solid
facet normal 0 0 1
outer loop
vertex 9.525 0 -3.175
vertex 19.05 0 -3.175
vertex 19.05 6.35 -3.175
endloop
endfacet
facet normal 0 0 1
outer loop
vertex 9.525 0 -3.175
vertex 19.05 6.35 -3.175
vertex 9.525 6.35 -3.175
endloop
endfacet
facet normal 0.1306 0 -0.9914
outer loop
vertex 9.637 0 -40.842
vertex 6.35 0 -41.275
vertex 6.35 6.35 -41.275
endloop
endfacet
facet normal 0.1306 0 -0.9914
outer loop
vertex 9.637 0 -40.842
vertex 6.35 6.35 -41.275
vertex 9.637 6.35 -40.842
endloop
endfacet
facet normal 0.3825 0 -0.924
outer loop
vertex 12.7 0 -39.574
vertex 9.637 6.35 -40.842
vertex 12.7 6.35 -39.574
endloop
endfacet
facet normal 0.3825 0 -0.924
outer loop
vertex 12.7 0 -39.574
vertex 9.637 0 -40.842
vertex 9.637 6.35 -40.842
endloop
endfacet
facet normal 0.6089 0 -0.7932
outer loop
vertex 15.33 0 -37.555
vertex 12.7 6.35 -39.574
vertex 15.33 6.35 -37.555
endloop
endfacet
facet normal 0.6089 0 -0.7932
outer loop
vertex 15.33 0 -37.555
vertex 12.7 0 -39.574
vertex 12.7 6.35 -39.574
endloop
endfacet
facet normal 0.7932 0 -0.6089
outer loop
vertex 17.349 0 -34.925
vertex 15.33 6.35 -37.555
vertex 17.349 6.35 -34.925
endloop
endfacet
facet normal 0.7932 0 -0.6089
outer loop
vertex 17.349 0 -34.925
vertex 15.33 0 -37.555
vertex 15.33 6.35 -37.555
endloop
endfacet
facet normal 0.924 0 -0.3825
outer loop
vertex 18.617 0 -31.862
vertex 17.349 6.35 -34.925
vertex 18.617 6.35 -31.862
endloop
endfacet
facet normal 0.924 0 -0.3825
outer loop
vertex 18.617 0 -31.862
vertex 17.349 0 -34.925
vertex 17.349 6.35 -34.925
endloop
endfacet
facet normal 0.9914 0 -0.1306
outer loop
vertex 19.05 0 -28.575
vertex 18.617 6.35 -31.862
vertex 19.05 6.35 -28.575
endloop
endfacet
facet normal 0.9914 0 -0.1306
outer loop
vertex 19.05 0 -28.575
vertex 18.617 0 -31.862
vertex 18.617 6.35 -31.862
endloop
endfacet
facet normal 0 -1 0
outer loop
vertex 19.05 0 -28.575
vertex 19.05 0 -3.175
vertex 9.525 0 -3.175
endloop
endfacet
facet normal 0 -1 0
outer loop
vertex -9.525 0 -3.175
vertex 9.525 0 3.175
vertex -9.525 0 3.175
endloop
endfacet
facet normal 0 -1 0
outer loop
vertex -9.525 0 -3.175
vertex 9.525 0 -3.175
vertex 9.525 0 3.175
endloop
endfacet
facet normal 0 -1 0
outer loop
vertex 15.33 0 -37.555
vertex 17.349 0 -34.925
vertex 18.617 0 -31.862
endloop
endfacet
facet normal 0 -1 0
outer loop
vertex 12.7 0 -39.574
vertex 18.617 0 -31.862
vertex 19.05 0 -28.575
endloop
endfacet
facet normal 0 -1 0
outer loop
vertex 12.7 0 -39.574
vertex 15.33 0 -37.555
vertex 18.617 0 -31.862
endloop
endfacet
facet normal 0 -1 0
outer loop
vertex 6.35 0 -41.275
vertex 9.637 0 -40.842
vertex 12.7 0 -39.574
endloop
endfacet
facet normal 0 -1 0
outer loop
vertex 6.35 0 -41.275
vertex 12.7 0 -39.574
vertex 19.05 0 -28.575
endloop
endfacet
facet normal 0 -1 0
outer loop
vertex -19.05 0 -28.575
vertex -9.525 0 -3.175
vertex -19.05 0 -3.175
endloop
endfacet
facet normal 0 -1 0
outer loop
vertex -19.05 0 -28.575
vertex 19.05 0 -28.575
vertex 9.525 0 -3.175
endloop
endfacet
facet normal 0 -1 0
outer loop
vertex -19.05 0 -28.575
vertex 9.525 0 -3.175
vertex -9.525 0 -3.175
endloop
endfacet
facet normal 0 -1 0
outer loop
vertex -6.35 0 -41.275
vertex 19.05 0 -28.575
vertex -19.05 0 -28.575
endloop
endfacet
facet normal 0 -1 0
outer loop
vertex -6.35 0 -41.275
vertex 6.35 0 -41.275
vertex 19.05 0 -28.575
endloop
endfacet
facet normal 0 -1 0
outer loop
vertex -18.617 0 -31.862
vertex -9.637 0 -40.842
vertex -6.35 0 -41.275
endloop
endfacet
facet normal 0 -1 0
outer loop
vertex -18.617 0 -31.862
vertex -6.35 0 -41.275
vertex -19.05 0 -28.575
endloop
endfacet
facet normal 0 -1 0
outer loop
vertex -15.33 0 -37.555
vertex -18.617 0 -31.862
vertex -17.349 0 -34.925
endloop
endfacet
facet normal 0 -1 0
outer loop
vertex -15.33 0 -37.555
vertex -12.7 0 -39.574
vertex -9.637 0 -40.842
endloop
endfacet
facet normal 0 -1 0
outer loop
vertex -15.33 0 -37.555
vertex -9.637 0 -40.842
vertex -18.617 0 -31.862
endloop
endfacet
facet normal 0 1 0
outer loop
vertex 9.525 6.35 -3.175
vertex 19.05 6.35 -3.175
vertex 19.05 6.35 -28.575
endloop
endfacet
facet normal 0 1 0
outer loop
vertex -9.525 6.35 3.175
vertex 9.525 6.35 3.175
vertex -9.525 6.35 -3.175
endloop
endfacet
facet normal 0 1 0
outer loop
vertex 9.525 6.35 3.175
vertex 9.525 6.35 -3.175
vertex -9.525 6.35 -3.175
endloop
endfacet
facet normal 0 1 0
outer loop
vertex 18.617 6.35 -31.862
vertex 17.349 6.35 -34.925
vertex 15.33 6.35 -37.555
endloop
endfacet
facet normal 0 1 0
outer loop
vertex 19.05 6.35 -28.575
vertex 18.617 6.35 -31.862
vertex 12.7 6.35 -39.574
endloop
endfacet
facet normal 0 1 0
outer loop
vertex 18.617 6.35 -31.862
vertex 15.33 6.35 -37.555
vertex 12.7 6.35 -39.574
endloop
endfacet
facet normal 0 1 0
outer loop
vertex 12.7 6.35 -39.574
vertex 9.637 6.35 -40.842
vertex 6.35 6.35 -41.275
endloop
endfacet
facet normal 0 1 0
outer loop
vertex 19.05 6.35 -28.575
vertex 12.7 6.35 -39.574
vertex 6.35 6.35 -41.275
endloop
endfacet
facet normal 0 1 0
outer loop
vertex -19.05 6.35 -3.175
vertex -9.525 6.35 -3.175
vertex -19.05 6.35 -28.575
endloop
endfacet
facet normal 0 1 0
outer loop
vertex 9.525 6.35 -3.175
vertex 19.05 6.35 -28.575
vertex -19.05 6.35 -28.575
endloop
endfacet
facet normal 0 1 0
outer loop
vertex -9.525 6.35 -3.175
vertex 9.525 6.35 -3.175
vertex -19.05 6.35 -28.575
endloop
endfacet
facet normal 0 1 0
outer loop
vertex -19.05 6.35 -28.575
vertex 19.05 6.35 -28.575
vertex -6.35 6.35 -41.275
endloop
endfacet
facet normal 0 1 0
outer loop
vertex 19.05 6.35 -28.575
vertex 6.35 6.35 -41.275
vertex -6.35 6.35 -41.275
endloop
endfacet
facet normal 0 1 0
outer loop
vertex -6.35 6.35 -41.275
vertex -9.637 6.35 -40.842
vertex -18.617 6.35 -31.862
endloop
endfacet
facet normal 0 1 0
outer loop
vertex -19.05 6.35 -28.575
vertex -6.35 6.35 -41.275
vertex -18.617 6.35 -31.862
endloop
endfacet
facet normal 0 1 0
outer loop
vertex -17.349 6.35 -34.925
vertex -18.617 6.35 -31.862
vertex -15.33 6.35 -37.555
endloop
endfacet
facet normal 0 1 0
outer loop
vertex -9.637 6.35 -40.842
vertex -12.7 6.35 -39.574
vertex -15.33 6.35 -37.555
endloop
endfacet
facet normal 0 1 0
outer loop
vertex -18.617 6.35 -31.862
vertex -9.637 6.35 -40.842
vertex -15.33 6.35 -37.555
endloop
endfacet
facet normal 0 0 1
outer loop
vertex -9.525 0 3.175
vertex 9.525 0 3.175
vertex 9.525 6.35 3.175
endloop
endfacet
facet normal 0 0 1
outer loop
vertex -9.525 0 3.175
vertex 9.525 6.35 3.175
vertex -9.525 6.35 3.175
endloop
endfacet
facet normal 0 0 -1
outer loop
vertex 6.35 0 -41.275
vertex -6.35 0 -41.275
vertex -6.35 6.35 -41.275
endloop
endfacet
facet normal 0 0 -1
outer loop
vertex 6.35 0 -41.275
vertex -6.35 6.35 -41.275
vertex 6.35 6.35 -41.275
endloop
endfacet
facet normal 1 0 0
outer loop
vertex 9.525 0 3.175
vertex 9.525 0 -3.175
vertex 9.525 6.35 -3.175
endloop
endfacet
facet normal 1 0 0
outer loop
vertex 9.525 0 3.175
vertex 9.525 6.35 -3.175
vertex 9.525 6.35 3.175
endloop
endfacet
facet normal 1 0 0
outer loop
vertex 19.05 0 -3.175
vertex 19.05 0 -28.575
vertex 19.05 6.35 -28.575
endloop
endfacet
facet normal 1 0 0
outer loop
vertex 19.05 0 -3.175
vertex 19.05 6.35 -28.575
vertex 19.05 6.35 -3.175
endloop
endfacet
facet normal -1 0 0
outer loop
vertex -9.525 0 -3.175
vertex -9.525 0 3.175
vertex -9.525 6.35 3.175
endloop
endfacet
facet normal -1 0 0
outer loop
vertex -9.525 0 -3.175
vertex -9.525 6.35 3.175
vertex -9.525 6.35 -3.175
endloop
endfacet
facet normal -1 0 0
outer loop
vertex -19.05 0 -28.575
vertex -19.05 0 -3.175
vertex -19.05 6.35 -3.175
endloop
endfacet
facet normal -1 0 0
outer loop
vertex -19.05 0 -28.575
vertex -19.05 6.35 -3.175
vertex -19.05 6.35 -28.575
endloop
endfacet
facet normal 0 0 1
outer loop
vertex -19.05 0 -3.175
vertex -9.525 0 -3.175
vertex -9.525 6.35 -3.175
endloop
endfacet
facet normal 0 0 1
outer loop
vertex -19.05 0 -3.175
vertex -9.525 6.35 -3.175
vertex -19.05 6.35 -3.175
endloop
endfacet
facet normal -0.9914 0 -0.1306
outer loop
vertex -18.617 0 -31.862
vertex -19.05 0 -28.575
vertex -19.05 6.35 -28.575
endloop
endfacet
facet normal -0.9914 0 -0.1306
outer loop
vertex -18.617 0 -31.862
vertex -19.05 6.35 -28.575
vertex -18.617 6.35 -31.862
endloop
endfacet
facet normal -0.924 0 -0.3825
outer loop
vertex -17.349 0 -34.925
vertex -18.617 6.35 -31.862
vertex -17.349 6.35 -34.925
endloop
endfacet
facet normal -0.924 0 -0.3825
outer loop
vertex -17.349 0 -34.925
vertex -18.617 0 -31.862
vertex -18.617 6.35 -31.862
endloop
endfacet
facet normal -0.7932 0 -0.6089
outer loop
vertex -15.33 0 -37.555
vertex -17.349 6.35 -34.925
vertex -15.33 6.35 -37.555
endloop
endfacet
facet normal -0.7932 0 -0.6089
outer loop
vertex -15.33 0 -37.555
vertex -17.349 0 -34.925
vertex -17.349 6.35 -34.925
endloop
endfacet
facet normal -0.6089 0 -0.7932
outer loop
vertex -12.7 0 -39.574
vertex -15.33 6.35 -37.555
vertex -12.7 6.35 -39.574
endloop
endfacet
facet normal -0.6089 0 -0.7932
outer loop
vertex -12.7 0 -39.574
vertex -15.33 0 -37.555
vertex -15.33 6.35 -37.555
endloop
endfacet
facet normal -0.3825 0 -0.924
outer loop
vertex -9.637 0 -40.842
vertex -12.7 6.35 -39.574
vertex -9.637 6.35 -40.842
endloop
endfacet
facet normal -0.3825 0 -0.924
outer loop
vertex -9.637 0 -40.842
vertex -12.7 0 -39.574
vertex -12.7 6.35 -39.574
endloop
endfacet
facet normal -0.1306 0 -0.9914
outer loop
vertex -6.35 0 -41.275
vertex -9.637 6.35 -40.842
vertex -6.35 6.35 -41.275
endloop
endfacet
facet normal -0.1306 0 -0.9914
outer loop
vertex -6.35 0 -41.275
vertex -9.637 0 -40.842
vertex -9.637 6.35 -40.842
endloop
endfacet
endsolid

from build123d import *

# Parameters (mm, degrees)
BOSS_EXTRUDE1_DEPTH = 6.35


with BuildPart() as part:
    # Sketch1 → Boss-Extrude1 (new body)
    with BuildSketch(Plane(origin=(0, 0, 0), x_dir=(1, 0, 0), z_dir=(0, 1, 0))):
        with BuildLine():
            Line((9.525, -3.175), (-9.525, -3.175))
            Line((-9.525, -3.175), (-9.525, 3.175))
            Line((-9.525, 3.175), (-19.05, 3.175))
            Line((-19.05, 3.175), (-19.05, 28.575))
            ThreePointArc((-19.05, 28.575), (-15.330256121, 37.555256121), (-6.35, 41.275))
            Line((-6.35, 41.275), (6.35, 41.275))
            ThreePointArc((6.35, 41.275), (15.330256121, 37.555256121), (19.05, 28.575))
            Line((19.05, 28.575), (19.05, 3.175))
            Line((19.05, 3.175), (9.525, 3.175))
            Line((9.525, 3.175), (9.525, -3.175))
        make_face()
    extrude(amount=BOSS_EXTRUDE1_DEPTH)


solid = part.part
